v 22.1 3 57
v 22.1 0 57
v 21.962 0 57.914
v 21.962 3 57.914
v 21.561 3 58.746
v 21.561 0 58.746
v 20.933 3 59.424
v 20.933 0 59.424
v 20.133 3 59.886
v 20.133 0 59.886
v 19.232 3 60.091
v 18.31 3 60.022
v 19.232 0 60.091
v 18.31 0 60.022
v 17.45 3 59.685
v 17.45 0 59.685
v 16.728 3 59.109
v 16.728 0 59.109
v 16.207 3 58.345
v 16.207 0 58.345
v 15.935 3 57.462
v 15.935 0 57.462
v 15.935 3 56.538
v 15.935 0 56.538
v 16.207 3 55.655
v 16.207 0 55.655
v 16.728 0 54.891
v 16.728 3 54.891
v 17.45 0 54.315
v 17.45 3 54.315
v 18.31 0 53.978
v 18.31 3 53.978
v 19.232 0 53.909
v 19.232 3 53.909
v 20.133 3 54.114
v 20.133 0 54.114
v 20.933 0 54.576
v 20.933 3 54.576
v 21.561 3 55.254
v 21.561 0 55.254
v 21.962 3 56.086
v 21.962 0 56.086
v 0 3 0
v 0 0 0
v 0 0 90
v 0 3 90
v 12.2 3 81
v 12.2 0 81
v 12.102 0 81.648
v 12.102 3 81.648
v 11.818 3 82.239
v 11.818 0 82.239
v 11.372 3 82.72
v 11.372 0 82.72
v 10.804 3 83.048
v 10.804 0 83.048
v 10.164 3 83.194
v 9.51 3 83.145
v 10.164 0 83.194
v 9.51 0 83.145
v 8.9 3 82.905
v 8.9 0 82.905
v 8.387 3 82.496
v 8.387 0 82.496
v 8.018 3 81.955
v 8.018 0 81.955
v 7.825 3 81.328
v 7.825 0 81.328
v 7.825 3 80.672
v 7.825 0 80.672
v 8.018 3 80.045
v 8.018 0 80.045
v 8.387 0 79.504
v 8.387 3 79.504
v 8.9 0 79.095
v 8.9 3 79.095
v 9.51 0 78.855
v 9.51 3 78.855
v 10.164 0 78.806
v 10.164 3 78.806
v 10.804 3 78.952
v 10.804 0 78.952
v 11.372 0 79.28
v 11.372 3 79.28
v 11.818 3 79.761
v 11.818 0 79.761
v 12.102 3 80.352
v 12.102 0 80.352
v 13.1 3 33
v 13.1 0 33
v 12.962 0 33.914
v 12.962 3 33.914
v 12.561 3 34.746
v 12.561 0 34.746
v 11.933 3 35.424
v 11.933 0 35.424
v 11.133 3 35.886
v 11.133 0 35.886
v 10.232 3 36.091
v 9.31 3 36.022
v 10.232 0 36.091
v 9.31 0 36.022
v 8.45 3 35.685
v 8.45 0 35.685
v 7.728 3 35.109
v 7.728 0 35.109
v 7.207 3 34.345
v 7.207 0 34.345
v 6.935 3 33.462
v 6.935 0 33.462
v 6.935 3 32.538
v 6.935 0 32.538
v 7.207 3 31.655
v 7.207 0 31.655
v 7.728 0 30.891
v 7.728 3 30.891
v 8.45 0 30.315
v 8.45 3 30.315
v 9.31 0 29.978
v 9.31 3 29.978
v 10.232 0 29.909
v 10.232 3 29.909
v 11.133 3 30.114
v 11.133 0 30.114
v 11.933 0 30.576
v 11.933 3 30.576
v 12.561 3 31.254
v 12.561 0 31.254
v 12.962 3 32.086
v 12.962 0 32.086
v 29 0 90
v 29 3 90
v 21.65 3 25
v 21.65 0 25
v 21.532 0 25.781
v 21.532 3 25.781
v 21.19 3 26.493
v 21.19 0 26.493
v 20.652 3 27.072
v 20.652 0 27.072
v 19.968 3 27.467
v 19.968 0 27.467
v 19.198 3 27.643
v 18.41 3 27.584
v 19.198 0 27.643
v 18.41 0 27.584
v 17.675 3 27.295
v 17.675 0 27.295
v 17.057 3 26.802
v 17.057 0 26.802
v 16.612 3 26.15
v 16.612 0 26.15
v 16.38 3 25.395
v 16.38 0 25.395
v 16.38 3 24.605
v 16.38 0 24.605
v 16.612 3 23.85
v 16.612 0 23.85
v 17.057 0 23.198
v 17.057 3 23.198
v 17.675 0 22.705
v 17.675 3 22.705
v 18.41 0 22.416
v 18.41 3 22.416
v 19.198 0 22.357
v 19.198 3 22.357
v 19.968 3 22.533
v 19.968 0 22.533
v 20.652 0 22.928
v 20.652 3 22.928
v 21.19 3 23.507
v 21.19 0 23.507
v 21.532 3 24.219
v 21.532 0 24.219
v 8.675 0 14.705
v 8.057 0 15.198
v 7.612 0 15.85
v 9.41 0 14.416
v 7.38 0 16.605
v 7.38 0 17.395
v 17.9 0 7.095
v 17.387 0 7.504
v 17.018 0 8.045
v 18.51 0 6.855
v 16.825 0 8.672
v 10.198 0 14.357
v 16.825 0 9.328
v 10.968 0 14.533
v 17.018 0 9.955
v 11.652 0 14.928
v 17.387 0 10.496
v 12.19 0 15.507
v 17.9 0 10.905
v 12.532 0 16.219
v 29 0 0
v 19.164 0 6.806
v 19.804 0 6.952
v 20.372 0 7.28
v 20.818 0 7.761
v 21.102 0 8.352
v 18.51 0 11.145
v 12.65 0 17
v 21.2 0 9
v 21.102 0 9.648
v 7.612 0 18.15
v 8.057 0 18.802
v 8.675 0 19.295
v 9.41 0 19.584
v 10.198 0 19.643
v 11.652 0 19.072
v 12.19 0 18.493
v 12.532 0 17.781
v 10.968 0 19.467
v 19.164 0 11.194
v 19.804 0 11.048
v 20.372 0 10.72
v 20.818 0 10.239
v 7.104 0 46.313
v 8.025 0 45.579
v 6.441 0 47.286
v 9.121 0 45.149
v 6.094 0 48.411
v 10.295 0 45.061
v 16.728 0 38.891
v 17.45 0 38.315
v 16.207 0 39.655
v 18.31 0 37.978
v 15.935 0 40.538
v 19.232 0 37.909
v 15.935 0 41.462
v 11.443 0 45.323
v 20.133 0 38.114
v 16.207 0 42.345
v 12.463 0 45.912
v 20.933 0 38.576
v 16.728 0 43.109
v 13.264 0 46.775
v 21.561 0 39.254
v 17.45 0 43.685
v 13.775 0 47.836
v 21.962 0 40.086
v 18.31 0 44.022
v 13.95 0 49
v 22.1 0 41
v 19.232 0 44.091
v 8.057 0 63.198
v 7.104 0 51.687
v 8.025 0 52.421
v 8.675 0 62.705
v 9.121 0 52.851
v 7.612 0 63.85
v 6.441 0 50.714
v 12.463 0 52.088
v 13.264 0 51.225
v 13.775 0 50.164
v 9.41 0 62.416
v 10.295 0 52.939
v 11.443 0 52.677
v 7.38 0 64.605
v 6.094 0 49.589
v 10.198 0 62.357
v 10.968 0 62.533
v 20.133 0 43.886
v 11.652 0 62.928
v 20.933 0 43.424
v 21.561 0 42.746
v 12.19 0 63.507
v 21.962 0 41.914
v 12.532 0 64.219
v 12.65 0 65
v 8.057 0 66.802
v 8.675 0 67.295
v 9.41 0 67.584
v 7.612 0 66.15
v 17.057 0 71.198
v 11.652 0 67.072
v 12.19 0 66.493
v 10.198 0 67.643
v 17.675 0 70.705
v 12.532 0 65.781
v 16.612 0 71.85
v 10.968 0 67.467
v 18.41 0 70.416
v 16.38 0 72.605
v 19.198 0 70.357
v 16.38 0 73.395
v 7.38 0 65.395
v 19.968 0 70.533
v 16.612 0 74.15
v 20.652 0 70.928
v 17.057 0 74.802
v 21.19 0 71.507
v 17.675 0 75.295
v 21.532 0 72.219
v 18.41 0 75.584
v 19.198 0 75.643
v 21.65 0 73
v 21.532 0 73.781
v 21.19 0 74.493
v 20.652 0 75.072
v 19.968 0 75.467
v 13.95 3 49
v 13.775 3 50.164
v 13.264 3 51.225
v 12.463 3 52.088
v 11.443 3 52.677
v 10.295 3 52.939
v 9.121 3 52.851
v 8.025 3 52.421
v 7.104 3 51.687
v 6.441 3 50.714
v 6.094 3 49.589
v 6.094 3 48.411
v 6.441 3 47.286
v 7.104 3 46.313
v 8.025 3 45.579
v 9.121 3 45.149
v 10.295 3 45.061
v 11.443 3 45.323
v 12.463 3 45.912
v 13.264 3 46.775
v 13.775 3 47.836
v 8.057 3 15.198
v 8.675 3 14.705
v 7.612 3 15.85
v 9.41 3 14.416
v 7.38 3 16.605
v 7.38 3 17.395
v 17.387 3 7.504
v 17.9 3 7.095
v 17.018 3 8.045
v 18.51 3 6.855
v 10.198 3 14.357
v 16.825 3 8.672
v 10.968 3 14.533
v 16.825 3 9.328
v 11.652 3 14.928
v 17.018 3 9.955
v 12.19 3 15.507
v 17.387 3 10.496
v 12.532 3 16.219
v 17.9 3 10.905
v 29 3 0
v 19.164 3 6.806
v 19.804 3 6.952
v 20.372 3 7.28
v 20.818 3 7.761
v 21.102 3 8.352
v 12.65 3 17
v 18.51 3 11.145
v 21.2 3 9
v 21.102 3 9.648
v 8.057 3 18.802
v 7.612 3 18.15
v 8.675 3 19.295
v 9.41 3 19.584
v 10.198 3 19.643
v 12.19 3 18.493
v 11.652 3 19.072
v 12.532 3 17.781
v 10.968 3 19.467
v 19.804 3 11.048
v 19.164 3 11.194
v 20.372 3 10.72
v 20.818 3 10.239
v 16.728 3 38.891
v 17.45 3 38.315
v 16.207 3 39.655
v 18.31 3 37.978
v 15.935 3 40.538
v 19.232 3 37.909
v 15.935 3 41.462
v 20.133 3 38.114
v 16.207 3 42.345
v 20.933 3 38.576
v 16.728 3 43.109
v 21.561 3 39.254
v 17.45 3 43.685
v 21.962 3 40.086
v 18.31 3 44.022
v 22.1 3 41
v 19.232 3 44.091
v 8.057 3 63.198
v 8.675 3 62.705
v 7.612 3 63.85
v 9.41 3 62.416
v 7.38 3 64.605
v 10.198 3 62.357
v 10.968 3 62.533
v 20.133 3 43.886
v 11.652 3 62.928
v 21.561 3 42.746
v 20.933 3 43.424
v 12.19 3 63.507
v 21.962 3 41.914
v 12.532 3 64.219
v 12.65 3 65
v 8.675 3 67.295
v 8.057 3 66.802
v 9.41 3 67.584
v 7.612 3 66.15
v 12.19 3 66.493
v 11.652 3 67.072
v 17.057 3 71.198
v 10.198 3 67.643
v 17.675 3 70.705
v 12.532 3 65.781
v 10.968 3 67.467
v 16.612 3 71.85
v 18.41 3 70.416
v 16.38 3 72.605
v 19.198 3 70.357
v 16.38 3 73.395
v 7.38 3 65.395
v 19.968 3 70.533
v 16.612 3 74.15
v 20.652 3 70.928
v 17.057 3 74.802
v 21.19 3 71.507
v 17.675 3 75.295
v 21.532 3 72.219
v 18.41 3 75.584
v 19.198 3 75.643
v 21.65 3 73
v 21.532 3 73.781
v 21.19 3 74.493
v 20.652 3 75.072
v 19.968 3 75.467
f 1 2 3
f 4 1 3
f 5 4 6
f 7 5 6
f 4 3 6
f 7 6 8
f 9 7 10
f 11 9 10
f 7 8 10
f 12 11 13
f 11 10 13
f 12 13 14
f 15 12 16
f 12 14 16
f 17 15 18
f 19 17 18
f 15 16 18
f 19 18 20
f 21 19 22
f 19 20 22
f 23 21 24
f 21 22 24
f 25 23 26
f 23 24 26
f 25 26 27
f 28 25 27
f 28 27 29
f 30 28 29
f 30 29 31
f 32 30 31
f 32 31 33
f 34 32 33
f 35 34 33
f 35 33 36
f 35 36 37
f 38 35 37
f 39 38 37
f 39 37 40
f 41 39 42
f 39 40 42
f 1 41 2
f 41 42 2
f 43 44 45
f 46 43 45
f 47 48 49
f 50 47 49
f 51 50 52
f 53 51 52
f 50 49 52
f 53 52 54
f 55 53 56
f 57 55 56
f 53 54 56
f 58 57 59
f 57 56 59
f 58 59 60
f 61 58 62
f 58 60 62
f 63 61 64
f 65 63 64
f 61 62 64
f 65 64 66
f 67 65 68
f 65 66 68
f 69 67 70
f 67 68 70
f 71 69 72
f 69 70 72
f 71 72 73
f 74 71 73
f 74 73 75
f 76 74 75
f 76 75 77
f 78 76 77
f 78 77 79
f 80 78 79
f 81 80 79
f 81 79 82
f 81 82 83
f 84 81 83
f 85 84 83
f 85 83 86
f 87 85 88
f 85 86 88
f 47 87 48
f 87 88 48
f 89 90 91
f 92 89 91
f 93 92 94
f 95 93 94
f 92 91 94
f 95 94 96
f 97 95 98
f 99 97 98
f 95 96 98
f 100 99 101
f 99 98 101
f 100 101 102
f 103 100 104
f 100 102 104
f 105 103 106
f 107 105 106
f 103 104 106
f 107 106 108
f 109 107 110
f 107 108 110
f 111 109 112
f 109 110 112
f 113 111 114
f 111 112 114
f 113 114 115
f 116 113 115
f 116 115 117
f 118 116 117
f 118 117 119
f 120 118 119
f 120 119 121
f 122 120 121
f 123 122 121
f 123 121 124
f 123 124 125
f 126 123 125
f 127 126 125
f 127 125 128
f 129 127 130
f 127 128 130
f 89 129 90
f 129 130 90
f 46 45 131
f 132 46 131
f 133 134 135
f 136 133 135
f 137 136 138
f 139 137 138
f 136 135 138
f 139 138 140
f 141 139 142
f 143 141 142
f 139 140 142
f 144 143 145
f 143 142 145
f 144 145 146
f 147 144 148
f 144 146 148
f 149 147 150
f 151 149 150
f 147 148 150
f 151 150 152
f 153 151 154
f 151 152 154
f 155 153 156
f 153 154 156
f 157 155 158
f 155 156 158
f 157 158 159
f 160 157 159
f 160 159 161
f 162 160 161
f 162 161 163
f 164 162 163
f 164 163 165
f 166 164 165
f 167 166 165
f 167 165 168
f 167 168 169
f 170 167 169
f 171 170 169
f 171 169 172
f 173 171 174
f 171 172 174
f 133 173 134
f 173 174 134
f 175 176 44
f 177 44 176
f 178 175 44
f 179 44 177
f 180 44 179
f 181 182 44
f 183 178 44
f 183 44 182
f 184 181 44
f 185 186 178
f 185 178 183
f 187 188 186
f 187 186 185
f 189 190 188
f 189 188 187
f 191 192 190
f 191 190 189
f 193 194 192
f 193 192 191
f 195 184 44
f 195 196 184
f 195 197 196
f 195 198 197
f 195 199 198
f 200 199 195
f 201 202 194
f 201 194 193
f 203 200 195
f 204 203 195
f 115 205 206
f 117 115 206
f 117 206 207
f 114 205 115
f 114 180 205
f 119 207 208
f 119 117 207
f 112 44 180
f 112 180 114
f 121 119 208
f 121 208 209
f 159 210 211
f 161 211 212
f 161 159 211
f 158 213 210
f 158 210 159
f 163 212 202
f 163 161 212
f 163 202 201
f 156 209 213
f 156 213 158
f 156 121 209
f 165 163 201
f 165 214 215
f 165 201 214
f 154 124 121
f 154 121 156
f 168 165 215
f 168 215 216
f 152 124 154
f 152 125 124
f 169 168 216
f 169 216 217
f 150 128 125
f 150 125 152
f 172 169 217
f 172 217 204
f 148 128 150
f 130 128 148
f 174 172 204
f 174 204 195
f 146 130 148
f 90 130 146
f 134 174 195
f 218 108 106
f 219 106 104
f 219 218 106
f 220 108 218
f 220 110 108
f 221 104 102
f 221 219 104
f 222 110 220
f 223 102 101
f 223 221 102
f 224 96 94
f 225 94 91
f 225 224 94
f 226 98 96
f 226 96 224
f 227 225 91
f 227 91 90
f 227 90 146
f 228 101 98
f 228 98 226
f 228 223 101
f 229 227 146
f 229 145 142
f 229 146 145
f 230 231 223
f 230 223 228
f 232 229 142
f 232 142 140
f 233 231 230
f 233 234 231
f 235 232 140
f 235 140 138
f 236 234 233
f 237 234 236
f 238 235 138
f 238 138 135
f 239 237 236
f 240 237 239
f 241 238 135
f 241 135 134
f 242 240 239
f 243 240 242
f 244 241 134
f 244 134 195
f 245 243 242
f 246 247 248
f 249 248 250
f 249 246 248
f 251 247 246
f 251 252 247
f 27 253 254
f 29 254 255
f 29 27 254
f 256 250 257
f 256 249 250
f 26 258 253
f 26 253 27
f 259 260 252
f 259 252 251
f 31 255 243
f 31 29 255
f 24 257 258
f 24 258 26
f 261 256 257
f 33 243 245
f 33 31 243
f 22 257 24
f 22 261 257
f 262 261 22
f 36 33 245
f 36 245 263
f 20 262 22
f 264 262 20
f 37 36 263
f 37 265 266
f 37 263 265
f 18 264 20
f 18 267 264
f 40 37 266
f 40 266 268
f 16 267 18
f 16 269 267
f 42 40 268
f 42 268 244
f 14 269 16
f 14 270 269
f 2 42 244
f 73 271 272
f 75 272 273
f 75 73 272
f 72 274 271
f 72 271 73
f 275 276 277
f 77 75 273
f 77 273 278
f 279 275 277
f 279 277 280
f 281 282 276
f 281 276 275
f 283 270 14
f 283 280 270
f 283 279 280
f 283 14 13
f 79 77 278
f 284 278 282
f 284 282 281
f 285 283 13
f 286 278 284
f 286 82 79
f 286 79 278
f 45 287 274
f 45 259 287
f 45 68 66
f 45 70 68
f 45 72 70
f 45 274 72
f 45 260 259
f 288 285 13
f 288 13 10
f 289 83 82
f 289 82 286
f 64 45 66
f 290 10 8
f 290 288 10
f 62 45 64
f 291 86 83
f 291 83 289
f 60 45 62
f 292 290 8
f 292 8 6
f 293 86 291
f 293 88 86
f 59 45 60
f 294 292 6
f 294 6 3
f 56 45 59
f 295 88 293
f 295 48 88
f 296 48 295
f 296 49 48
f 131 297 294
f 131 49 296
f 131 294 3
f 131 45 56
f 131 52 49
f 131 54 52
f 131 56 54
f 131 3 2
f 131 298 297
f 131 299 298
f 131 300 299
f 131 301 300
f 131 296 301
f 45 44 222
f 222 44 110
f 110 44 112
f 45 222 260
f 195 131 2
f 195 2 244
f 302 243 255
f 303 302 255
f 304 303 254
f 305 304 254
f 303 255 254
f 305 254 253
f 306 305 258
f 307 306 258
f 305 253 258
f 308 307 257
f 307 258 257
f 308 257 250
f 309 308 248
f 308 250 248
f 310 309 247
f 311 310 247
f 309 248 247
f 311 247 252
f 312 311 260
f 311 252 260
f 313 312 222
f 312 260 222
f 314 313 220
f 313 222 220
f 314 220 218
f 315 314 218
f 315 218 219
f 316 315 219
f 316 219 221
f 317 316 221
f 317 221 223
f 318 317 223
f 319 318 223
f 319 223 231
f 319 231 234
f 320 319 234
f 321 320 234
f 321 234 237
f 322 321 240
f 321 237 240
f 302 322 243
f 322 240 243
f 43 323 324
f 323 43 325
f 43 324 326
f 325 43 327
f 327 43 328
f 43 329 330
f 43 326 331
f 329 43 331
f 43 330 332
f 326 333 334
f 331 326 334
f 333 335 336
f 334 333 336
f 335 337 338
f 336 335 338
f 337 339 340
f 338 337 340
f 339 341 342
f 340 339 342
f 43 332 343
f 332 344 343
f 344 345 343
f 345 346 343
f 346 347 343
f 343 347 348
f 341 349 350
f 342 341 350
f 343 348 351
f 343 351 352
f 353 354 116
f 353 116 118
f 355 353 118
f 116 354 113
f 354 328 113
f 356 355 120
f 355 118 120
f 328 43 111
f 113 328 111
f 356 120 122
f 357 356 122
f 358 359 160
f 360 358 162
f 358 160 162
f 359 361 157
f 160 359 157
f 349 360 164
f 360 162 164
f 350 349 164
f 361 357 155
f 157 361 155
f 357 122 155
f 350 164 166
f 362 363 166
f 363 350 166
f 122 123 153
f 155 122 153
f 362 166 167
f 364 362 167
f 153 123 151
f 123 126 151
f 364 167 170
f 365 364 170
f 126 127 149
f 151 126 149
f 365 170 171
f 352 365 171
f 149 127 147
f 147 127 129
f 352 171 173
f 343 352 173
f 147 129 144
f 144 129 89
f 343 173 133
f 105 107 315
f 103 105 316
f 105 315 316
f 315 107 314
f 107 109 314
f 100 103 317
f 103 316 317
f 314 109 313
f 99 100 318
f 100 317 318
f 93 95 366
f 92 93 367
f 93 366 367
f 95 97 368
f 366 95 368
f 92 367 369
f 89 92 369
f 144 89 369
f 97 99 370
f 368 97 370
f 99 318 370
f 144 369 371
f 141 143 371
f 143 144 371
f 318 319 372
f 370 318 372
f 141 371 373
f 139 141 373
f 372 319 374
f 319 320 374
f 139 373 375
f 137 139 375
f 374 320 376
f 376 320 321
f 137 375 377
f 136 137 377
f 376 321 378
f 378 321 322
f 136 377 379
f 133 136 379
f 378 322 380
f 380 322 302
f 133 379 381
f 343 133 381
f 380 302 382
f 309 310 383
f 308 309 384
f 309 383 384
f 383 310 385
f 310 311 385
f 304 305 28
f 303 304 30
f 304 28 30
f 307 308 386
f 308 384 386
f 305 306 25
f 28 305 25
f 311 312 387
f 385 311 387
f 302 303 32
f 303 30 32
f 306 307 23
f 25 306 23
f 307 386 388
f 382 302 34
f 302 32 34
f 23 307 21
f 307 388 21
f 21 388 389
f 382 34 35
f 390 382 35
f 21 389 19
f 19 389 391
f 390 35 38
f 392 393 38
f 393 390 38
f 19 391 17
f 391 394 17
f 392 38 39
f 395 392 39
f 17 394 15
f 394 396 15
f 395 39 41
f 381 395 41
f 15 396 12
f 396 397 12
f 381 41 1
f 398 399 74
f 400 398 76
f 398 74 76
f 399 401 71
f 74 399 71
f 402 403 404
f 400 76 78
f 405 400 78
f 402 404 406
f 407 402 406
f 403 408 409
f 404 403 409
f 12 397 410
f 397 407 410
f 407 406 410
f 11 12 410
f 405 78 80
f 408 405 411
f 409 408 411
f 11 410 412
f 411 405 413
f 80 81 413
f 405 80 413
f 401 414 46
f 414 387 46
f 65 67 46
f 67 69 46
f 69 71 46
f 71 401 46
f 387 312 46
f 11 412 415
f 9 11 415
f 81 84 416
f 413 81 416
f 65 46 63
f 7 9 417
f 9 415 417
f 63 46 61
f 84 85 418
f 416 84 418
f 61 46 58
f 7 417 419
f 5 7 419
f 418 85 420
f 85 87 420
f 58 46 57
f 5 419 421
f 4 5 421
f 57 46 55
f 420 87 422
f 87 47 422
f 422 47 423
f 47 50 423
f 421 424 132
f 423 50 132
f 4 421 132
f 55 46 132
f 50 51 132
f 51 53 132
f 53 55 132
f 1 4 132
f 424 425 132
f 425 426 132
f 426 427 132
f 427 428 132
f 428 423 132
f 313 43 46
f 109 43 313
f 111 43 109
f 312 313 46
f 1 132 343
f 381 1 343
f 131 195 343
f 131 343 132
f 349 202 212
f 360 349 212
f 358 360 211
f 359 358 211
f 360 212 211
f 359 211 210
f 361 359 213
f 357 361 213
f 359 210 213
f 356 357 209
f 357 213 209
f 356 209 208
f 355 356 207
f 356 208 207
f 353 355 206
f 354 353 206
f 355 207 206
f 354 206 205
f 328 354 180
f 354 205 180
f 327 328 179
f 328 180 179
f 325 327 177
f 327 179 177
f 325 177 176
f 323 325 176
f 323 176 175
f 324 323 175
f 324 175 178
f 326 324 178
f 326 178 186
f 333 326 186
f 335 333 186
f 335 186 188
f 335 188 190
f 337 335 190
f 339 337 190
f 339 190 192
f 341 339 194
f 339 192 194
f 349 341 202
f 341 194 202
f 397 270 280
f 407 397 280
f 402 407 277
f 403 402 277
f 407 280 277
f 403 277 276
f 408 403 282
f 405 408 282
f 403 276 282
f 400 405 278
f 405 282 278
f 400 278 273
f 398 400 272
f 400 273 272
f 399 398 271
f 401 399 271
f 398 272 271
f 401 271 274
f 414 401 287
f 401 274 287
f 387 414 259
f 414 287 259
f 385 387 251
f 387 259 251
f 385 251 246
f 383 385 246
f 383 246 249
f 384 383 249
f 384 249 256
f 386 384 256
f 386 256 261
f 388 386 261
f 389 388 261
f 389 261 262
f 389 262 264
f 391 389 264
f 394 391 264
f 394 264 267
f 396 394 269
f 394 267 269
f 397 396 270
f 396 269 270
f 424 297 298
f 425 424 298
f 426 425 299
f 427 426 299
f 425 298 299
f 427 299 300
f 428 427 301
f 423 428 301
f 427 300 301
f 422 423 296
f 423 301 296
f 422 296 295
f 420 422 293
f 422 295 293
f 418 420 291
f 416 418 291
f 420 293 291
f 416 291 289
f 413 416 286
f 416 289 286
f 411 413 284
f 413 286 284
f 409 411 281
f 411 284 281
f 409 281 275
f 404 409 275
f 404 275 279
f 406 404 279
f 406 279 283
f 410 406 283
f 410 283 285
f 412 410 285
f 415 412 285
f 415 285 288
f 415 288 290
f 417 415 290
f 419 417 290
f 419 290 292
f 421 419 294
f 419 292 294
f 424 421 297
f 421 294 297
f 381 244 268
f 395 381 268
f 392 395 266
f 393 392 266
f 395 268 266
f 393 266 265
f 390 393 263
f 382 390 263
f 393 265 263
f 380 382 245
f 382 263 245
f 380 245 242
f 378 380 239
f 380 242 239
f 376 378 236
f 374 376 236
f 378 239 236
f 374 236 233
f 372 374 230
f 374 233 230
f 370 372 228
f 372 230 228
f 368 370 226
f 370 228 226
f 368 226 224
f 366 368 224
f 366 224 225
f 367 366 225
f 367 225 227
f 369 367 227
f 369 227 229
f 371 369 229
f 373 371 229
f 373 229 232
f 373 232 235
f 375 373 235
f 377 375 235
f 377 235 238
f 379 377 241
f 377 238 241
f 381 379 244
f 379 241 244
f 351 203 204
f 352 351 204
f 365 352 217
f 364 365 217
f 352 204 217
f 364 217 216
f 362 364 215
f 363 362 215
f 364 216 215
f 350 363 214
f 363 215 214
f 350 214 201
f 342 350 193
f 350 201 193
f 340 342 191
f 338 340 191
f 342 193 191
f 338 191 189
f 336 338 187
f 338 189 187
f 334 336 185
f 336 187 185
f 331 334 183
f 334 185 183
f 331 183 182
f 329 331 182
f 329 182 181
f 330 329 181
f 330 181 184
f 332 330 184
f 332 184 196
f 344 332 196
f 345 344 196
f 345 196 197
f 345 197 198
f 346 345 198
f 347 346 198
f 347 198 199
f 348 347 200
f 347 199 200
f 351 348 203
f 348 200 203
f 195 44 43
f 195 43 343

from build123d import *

# Parameters (mm, degrees)
F0_W     = 29
F0_H     = 90
F0_R     = 2.65
F0_R_2   = 3.1
F0_R_3   = 2.2
F0_R_4   = 3.95
F1_DEPTH = 3


with BuildPart() as f1:
    # F0 (on Front) → F1 (new body)
    with BuildSketch(Plane.XZ):
        with Locations((14.5, 45)):
            Rectangle(F0_W, F0_H)
        with Locations((10, 17)):
            Circle(F0_R, mode=Mode.SUBTRACT)
        with Locations((10, 33)):
            Circle(F0_R_2, mode=Mode.SUBTRACT)
        with Locations((19, 9)):
            Circle(F0_R_3, mode=Mode.SUBTRACT)
        with Locations((19, 25)):
            Circle(F0_R, mode=Mode.SUBTRACT)
        with Locations((19, 41)):
            Circle(F0_R_2, mode=Mode.SUBTRACT)
        with Locations((10, 49)):
            Circle(F0_R_4, mode=Mode.SUBTRACT)
        with Locations((10, 65)):
            Circle(F0_R, mode=Mode.SUBTRACT)
        with Locations((10, 81)):
            Circle(F0_R_3, mode=Mode.SUBTRACT)
        with Locations((19, 57)):
            Circle(F0_R_2, mode=Mode.SUBTRACT)
        with Locations((19, 73)):
            Circle(F0_R, mode=Mode.SUBTRACT)
    extrude(amount=-F1_DEPTH)


solid = f1.part
